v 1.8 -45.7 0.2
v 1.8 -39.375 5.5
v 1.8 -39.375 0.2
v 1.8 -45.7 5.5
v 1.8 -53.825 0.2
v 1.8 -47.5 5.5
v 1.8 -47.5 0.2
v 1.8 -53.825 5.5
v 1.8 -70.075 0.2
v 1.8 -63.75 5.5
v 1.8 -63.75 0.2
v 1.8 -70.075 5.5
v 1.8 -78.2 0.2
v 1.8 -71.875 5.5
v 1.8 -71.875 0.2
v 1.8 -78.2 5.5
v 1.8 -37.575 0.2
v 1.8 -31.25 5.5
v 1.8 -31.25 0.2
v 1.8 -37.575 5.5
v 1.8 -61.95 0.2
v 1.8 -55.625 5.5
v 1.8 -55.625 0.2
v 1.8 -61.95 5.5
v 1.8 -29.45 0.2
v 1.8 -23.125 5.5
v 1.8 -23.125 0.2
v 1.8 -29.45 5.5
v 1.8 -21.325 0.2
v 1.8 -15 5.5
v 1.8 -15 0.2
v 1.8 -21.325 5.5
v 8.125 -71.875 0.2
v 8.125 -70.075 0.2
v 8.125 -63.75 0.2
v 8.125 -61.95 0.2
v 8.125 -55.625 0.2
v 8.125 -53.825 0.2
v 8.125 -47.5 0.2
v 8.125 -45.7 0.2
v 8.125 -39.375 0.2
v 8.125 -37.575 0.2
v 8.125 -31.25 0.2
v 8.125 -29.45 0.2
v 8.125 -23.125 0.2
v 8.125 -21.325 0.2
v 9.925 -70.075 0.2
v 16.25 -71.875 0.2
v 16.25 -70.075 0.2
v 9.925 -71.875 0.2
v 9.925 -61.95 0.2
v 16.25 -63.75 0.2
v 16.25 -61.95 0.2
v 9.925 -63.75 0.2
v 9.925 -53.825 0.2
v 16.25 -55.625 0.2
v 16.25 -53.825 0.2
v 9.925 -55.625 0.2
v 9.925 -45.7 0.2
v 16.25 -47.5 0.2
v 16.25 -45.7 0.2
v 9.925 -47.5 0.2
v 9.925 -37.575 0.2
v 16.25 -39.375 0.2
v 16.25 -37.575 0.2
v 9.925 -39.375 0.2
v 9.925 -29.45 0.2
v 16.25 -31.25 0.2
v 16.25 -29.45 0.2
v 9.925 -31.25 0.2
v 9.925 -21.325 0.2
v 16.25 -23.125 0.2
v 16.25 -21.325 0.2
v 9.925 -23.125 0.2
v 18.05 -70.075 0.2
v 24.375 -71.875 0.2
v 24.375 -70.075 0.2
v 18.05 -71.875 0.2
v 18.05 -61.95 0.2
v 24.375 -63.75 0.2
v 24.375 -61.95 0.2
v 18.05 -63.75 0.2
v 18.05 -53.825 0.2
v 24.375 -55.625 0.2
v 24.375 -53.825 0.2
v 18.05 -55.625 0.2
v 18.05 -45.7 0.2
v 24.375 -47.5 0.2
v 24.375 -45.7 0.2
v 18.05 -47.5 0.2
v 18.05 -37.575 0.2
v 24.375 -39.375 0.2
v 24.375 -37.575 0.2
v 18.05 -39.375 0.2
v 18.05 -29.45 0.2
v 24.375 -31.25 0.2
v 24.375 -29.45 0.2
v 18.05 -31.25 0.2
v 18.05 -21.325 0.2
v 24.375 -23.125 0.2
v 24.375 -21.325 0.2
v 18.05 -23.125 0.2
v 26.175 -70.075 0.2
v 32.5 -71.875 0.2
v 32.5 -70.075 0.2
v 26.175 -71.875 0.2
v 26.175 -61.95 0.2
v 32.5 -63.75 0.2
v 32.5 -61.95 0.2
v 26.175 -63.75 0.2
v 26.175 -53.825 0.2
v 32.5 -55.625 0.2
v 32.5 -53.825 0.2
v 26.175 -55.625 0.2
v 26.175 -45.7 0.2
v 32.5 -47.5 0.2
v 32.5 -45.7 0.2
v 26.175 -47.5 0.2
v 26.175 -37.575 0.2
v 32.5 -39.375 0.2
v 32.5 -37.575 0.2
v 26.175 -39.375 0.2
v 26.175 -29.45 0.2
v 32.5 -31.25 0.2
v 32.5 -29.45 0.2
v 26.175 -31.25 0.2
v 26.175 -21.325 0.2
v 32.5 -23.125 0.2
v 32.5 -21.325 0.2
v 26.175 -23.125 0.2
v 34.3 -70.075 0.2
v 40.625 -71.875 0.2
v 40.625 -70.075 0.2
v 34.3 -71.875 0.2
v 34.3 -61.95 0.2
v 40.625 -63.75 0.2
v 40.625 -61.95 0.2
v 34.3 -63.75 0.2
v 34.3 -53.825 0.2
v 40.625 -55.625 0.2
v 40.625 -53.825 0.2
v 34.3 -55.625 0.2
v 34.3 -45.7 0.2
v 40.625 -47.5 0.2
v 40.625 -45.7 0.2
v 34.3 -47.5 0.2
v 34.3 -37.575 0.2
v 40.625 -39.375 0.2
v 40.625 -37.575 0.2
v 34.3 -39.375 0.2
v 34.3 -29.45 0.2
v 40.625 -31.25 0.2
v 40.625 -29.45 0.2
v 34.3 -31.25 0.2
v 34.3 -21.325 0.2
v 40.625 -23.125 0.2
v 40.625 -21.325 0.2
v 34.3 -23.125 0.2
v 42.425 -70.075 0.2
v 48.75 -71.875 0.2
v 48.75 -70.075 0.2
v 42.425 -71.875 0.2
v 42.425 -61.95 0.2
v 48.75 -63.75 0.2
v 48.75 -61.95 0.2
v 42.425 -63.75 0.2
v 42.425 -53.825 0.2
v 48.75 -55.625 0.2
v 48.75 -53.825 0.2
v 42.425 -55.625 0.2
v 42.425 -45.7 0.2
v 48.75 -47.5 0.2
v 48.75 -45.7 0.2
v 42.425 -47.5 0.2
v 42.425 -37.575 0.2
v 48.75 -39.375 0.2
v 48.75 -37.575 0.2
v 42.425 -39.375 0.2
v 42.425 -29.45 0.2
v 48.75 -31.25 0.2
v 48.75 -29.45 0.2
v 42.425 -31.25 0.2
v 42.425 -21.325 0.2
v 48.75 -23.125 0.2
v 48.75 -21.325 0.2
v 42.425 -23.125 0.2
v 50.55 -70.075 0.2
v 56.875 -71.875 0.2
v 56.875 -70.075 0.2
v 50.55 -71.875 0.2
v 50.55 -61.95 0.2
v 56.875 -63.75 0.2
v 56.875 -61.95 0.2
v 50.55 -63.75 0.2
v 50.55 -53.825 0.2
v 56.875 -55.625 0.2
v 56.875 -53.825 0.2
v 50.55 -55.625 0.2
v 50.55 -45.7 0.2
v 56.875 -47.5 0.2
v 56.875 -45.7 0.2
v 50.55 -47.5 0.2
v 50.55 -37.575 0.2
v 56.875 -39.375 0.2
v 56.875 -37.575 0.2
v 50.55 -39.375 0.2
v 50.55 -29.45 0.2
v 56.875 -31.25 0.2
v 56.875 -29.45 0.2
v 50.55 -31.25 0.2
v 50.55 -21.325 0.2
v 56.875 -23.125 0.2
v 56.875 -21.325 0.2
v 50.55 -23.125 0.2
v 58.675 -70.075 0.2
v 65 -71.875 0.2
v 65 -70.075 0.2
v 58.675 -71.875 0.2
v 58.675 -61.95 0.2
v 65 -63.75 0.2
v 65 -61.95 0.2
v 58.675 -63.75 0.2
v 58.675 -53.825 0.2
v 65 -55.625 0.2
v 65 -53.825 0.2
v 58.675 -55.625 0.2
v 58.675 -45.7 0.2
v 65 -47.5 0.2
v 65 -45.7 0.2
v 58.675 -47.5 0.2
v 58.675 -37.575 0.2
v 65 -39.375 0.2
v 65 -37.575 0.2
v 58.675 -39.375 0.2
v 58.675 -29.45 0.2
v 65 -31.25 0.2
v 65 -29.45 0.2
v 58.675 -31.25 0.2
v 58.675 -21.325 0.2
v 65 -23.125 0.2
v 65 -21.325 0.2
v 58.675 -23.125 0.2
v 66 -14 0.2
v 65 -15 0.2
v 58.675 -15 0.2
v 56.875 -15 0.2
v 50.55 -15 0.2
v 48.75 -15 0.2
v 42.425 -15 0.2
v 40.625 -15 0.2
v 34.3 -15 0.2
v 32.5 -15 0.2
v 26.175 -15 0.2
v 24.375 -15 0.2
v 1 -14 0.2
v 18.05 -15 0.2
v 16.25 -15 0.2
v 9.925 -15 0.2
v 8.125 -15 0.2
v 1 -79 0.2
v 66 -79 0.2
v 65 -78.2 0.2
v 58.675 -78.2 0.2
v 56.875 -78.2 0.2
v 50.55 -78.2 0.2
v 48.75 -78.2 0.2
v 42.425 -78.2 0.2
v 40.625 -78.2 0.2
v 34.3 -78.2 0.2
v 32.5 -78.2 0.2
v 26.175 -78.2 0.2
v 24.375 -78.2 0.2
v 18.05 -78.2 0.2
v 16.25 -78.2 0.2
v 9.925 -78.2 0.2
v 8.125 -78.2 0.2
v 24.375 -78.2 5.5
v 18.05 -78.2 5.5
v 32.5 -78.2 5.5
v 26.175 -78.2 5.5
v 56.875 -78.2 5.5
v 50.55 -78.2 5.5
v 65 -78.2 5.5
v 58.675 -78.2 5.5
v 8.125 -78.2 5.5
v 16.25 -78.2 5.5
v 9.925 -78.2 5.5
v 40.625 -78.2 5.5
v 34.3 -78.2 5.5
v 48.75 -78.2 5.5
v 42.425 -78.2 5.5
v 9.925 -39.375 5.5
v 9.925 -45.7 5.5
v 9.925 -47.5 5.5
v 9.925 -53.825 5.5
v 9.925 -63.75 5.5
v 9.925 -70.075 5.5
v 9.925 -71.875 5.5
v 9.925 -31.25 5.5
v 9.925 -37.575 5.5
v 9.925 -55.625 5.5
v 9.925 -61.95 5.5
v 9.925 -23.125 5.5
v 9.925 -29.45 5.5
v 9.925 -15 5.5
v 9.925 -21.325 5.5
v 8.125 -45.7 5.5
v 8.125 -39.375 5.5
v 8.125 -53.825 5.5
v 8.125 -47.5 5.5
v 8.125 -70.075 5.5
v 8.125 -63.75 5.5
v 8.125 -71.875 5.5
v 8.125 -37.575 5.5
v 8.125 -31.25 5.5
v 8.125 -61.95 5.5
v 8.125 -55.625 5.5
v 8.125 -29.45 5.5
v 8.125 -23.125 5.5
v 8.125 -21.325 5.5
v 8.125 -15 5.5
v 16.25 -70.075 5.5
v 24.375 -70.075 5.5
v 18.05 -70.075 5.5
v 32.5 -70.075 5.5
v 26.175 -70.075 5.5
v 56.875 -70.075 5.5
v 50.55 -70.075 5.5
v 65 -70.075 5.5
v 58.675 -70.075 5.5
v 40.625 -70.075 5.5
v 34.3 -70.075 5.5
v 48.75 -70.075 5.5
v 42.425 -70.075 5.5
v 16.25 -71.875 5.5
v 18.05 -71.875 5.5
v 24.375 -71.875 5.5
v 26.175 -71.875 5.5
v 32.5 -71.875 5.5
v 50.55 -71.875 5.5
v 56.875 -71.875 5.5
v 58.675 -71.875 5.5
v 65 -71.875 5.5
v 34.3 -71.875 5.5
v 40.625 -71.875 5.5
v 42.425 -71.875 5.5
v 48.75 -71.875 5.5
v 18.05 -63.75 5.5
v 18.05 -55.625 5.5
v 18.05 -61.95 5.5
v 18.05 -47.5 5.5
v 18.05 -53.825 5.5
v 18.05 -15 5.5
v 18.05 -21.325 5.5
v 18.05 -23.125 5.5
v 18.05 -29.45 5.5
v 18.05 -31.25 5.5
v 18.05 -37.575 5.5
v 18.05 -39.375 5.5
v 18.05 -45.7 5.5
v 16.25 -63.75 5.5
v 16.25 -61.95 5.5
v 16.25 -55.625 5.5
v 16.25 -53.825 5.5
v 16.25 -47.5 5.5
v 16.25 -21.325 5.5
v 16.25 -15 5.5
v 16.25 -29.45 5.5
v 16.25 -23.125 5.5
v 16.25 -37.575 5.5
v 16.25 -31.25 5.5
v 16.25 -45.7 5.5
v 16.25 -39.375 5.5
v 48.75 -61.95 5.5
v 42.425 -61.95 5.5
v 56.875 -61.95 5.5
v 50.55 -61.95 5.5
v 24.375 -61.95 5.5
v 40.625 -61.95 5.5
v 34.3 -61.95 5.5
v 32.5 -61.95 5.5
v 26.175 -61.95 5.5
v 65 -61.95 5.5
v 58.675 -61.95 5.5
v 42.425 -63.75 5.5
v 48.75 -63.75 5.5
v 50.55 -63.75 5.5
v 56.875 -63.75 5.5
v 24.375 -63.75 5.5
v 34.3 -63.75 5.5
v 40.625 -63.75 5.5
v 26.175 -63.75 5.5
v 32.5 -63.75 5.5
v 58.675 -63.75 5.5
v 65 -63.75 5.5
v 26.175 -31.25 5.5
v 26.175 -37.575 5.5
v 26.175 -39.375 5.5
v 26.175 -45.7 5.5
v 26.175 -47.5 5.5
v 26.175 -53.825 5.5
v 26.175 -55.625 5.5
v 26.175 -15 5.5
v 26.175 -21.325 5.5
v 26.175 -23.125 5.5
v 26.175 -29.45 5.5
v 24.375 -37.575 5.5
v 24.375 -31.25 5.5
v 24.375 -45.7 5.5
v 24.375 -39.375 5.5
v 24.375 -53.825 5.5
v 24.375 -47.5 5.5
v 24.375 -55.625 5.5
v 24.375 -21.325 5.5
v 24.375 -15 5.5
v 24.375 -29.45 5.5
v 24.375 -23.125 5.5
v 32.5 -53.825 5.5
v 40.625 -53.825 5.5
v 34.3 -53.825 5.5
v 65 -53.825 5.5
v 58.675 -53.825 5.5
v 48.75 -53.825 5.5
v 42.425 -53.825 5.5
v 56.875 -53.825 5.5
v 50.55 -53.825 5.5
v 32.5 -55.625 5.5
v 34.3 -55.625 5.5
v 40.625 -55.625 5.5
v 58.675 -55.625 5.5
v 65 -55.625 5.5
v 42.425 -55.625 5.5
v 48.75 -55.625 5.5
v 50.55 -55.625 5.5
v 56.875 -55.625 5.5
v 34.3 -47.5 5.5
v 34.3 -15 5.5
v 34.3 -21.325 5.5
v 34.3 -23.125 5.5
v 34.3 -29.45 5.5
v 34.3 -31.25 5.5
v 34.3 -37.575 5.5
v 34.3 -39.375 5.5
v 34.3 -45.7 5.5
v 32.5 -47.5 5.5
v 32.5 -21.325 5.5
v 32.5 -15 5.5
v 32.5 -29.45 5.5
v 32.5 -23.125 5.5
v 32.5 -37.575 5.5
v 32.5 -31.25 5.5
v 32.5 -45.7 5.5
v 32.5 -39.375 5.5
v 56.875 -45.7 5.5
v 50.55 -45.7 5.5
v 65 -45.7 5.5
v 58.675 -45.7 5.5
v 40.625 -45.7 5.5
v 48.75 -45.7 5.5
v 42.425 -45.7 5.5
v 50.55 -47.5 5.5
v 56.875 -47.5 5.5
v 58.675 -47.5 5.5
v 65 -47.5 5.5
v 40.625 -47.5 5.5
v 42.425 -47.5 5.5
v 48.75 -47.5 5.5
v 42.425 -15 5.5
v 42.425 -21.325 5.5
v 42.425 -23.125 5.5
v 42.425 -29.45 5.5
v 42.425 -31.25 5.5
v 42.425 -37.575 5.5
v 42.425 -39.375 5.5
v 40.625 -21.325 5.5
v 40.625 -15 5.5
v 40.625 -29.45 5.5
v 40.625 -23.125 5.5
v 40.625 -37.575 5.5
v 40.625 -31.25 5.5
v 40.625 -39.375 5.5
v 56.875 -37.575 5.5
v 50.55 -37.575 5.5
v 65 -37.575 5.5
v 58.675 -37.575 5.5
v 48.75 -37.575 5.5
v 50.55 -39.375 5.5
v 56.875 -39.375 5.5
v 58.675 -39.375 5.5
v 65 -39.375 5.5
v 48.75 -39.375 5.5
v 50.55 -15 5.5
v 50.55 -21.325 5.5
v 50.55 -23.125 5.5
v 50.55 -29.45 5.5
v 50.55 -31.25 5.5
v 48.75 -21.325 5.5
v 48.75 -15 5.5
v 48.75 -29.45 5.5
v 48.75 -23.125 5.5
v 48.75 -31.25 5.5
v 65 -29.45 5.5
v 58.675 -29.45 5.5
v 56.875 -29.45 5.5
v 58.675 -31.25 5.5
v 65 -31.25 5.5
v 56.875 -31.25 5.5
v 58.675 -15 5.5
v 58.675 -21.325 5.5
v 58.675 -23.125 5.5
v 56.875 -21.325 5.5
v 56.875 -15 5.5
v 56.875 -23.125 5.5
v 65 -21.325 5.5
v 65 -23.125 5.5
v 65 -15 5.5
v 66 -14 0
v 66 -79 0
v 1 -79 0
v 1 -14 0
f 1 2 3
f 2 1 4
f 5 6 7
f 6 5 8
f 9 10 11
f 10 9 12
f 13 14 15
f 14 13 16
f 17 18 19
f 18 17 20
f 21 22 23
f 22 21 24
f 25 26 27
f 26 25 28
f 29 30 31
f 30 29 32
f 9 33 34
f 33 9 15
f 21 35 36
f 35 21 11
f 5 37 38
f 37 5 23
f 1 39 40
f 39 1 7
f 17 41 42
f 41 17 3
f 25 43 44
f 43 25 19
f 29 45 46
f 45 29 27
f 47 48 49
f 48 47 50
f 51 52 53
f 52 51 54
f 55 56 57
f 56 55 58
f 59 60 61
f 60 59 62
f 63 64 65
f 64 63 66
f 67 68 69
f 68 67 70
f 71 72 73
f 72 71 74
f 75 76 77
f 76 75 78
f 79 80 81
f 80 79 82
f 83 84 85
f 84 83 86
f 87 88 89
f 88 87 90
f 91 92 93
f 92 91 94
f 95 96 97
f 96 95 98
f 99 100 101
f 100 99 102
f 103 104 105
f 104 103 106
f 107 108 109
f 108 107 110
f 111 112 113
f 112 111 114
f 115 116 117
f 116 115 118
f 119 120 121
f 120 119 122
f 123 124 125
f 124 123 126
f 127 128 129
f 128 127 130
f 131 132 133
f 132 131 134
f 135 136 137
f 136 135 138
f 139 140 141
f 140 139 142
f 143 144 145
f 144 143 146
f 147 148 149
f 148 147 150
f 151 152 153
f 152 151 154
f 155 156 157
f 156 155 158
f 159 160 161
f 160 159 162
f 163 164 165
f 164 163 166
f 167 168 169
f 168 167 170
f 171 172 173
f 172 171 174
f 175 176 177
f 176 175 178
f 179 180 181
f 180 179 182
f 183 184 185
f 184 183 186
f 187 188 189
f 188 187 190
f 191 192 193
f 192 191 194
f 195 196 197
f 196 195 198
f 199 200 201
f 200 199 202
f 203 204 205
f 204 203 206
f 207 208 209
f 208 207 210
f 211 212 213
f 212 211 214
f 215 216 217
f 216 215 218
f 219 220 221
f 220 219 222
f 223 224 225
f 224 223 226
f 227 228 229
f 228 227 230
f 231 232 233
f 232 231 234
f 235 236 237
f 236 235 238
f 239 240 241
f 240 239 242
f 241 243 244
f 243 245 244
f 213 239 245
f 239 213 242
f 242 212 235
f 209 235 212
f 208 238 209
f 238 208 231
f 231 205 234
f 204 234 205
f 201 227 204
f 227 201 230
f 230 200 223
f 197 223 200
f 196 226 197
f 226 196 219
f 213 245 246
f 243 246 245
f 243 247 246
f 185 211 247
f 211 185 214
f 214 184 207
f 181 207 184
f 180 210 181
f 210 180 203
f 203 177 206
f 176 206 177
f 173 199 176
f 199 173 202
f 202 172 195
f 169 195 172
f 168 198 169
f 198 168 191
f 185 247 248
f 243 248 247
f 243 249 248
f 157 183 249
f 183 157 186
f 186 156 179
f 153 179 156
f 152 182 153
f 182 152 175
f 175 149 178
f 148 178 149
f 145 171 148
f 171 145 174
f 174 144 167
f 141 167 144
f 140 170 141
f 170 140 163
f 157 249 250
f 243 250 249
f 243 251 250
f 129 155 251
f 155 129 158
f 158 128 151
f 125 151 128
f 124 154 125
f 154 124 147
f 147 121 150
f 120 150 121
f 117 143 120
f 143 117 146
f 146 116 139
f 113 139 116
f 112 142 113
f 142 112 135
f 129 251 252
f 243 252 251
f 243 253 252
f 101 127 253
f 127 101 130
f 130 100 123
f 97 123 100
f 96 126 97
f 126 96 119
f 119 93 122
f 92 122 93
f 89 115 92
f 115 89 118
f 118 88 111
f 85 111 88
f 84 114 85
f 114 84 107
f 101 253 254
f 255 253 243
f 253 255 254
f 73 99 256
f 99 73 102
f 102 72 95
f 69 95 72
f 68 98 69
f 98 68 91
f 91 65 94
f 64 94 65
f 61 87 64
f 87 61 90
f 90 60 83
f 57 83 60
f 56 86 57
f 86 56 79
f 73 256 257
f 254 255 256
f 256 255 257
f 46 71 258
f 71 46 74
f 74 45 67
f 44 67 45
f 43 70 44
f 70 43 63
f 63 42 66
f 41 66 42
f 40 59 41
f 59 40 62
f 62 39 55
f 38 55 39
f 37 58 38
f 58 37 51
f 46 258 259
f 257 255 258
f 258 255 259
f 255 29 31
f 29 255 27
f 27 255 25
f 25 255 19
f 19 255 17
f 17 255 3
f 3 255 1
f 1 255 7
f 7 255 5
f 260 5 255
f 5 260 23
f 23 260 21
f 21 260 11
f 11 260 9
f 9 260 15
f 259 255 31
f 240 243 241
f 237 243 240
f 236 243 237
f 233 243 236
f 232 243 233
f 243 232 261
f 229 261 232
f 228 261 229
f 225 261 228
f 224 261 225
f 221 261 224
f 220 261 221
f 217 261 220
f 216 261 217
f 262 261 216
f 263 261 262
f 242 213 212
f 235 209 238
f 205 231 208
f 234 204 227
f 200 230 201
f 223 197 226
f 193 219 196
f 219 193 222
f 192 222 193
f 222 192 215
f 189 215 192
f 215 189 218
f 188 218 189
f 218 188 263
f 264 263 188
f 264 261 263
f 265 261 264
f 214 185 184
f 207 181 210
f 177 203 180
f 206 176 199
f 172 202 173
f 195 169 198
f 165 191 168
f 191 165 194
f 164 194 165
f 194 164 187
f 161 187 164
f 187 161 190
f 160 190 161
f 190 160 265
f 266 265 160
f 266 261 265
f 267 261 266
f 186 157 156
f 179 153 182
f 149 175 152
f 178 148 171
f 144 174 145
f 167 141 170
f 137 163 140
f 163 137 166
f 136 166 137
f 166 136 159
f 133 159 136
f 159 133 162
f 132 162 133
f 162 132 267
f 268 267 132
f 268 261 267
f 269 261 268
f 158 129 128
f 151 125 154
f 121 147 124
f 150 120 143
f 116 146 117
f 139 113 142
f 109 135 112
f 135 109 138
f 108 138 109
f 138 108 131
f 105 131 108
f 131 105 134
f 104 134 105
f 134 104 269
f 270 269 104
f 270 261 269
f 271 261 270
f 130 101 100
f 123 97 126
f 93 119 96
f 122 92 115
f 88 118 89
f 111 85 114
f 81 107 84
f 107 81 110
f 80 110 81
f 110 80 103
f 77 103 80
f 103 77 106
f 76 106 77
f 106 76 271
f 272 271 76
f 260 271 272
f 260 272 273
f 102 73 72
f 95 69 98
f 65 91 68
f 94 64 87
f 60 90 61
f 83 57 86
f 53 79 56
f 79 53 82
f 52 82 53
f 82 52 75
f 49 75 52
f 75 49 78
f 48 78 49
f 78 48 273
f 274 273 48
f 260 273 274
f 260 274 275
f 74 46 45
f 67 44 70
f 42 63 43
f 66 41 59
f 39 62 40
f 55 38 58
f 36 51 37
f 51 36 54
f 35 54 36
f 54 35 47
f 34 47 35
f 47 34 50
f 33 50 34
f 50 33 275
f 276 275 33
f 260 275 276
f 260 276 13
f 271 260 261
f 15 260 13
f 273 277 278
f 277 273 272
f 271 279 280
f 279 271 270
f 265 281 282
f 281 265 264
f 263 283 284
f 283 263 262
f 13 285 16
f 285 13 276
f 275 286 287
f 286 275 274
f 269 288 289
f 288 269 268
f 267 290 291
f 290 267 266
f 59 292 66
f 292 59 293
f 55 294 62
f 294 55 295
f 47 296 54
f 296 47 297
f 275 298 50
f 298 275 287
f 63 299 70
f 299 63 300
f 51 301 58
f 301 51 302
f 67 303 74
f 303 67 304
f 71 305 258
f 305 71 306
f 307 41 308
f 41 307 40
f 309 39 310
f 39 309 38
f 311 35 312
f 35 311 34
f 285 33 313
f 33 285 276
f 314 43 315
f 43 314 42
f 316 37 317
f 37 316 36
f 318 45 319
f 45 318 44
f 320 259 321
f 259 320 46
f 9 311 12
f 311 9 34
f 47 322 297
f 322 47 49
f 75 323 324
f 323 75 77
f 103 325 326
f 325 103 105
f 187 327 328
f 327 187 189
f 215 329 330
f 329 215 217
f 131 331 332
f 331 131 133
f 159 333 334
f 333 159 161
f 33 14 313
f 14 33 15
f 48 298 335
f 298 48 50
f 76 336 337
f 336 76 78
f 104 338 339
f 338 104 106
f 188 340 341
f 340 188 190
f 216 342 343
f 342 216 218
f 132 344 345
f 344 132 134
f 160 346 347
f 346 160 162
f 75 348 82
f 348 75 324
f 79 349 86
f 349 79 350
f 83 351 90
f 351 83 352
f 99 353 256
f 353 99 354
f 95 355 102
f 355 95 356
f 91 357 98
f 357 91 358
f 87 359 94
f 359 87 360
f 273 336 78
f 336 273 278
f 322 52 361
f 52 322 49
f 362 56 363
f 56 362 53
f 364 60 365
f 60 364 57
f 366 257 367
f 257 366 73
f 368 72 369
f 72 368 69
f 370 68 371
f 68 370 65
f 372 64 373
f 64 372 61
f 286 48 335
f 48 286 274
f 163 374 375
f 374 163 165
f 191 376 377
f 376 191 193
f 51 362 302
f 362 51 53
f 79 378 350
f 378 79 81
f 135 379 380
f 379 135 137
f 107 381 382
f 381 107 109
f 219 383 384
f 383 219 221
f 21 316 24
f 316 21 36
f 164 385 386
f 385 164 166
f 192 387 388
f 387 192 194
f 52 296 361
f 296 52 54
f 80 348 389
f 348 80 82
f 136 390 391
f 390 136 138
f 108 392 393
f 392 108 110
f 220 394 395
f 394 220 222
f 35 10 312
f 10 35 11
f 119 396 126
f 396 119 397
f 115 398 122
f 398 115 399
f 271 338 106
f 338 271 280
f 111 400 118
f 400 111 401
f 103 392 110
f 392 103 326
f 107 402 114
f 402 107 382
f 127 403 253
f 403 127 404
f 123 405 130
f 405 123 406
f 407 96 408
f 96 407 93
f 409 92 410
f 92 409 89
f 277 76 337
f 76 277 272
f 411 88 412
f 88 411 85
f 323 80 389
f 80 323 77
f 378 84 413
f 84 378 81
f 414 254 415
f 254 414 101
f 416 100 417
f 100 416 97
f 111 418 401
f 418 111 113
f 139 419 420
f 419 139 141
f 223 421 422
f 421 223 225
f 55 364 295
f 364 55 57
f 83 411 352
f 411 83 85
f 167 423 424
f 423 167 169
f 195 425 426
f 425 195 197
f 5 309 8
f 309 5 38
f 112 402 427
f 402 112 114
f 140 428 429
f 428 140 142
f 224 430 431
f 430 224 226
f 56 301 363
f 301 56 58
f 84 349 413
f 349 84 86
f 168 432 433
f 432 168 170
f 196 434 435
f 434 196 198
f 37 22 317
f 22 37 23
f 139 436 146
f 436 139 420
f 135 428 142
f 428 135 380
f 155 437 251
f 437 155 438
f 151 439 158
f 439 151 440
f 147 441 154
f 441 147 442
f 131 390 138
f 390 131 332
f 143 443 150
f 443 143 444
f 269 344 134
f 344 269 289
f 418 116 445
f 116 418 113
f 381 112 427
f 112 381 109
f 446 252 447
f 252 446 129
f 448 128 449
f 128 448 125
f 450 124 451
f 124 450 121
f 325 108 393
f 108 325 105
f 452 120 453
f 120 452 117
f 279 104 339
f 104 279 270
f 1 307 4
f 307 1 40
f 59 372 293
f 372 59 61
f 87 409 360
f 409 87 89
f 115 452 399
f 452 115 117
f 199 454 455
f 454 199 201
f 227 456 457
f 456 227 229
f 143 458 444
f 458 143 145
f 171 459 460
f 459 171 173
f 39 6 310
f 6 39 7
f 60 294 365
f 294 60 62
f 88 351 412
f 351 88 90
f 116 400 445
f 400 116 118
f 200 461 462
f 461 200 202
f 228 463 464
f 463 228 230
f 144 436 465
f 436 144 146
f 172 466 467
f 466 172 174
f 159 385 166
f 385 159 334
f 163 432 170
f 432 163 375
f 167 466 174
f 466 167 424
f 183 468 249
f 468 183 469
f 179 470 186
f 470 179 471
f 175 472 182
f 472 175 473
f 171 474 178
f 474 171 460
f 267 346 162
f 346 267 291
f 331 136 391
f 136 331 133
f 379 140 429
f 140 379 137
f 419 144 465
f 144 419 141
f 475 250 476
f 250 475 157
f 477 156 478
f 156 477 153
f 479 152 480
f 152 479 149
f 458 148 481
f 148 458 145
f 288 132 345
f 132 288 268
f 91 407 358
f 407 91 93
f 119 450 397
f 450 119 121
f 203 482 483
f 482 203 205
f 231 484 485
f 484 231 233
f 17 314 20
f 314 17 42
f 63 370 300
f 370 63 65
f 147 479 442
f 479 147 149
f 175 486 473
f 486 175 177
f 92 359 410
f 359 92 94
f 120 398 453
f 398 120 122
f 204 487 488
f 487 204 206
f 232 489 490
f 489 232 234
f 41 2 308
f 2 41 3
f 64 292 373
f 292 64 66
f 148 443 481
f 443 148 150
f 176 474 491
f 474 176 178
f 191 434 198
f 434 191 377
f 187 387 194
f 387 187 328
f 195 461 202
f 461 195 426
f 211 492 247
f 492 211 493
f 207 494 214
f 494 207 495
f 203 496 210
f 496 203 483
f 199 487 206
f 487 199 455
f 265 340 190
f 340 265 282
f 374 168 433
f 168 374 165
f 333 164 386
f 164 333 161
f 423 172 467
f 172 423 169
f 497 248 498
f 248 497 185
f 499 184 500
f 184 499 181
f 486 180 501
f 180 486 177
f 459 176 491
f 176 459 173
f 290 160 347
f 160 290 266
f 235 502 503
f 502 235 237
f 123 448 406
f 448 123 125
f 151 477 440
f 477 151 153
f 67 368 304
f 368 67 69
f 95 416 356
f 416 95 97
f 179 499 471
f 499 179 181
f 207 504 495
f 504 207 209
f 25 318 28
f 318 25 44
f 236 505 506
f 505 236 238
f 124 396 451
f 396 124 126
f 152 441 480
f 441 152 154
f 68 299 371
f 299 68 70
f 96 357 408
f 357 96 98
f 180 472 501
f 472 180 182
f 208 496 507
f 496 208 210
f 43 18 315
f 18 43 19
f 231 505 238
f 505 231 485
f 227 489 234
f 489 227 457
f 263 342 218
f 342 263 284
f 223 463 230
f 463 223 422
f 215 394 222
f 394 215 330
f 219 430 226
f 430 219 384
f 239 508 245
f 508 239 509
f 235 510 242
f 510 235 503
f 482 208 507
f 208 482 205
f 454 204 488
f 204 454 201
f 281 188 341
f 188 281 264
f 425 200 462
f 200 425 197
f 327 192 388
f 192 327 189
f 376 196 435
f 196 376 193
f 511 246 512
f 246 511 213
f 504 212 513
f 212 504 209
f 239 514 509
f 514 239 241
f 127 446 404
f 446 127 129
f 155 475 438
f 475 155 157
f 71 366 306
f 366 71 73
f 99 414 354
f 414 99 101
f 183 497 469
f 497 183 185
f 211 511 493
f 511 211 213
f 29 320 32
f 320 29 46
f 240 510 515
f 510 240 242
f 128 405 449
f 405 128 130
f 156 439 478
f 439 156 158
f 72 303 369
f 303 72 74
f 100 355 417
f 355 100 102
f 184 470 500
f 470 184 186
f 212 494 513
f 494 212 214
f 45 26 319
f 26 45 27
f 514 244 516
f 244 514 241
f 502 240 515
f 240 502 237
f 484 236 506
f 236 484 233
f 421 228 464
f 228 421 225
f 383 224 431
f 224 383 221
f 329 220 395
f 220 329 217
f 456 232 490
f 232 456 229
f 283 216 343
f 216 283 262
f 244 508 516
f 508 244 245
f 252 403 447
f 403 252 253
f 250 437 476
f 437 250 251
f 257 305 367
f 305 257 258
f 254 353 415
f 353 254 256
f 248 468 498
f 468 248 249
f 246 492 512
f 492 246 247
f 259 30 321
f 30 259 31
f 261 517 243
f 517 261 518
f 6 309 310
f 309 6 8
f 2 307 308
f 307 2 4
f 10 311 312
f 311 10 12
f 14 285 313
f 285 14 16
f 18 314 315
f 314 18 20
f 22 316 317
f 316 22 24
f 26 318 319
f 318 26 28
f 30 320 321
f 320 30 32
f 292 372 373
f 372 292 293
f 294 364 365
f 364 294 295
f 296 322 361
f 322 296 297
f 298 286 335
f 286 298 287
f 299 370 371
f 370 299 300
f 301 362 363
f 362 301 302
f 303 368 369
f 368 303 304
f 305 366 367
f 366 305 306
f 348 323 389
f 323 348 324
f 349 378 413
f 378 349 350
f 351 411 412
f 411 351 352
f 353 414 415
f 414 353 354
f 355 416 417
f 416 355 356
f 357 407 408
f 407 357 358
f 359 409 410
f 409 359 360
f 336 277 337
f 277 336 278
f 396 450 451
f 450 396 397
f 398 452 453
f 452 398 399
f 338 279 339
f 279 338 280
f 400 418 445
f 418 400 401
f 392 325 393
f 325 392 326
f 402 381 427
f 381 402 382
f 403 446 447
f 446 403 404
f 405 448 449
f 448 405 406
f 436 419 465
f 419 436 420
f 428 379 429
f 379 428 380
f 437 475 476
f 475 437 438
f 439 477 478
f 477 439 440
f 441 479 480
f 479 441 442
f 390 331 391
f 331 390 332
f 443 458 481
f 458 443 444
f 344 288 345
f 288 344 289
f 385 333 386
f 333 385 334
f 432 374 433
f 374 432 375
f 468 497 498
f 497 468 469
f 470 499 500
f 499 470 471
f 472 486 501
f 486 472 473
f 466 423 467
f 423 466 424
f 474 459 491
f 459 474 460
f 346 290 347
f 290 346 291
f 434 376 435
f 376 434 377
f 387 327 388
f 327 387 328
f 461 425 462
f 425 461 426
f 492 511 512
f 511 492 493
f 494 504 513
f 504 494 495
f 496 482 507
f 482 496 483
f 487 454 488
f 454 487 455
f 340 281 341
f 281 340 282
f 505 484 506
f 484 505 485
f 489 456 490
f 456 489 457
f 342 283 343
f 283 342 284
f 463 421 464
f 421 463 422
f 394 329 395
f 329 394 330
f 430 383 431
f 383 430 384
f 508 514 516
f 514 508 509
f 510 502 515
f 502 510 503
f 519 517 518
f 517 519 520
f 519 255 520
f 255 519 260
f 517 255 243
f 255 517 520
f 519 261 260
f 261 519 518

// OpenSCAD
letters = [ 
	[ "F", "O", "U", "R", "N", "I", "N", "E" ],
	[ "T", "W", "E", "L", "E", "V", "E", "N" ],
	[ "S", "I", "X", "T", "H", "R", "E", "E" ],
	[ "F", "I", "V", "E", "I", "G", "H", "T" ],
	[ "D", "P", "A", "S", "T", "O", "R", "O" ],
	[ "F", "I", "V", "E", "H", "A", "L", "F" ],
	[ "Q", "U", "A", "R", "T", "E", "R", "Y" ],
	[ "A", "T", "W", "E", "N", "T", "Y", "D" ]
];

$fn = 32;
max = 65; 
s = 65/8;
d_h = 5+1;  // was 5
w_h = 10;
b_h = 5;
c_h = 23;
letter_depth = w_h+1;

f = "Stencil Gothic";

module face()
{
	for (r = [0:7])
	{
		for (c = [0:7])
		{
			#translate([r*s + s/2+.2, c*s+s/2+1-0.6, 0])
				linear_extrude(height = letter_depth+1)
					text(
						letters[c][r], 
						font = f,
						size=6, 
						$fn=20, 
						valign="center", 
						halign = "center"
					);
		}
	}
}

module case_front()
{
	difference()
	{
		union()
		{
			translate([-5,-5,0]) 	cube([5,max+6+5, w_h]);	// left side
			translate([max+1,-5,0])	cube([5,max+6+5, w_h]); // right side 
			translate([0,max+1,0]) 	cube([max+2, 5, w_h]);	// top
			translate([-1,-5,0])	cube([max+3, 5, w_h]); 	// bottom
		}
		
		// mounting holes
		
		translate([-1.5,-1.5,0]) 			cylinder(d=2.4,h=w_h-2);	// ll 
		translate([max+1+1.5,-5+3.5,0]) 	cylinder(d=2.4,h=w_h-2);	// lr
		translate([-1.5,max+1+1.5,0]) 		cylinder(d=2.4,h=w_h-2);	// ul
		translate([max+1+1.5,max+1+1.5,0])	cylinder(d=2.4,h=w_h-2);	// ur 
	}
}

module dividers(w=1,hh=d_h)
{
	for (x = [0:8])
	{
		translate([s*x, 1, 0]) cube([w,max,d_h]);
		translate([0, s*x,0]) cube([max+1, w, d_h]);
	}
}

module clock_face()
{
	difference()
	{
		union()
		{
			translate([0,0,w_h-1]) cube([max+1,max+1,1]);
			translate([0,0,b_h]) dividers();
		}
		
		face();
		
		// cutout for connector
		translate([1,56,0])
			#cube([7.125,3,7]);
	}
	case_front();
}

module diffusers()
{
	difference()
	{
		translate([1,1,0]) cube([max,max,4.5+1]);  // was 4.5
		translate([0,0,0.2])
			dividers(1.8 );
	}	
}

module standoff()
{
	difference()
	{
		cylinder(d1=7,d2=5,h=7);
		translate([0,0,2])	cylinder(d=2, h=7);
	}
}

module rtc_mounts() {
	// standoffs for rtc
	
	translate([25, 0, 2])
		standoff();
	
	translate([0, 18, 2])
		standoff();
	
	translate([25, 18, 2])
		standoff();
}

module case_back()
{
	difference()
	{
		union()
		{
			cube([max+1,max+1,2]);
			translate([-5,-5,0]) 		cube([5+1,max+6+5, c_h]);	// left side
			translate([max+1-1,-5,0])	cube([5+1,max+6+5, c_h]); // right side 
			translate([0,max-1,0]) 		#cube([max+2, 6+1, c_h]);	// top
			translate([-1,-5,0])		cube([max+2, 6+1, c_h]); 	// bottom
		}
		
		// mount holes 
		
		translate([-1.5,-1.5,0]) 			cylinder(d=3,h=c_h+4);	// ll 
		translate([max+1+1.5,-5+3.5,0]) 	cylinder(d=3,h=c_h+4);	// lr
		translate([-1.5,max+1+1.5,0]) 		cylinder(d=3,h=c_h+4);	// ul
		translate([max+1+1.5,max+1+1.5,0])	cylinder(d=3,h=c_h+4);	// ur 
		
		translate([-1.5,-1.5,0]) 			cylinder(d=5.5,h=4);	// ll 
		translate([max+1+1.5,-5+3.5,0]) 	cylinder(d=5.5,h=4);	// lr
		translate([-1.5,max+1+1.5,0]) 		cylinder(d=5.5,h=4);	// ul
		translate([max+1+1.5,max+1+1.5,0])	cylinder(d=5.5,h=4);	// ur 
		
		// FTDI cutout
		//#translate([18+6+5+6,-5,15])	cube([19, 8, 8]); 	// bottom

		// Time Adjust Button Holes

		translate([22.75+6.5+12, 10+46-2, 0])
			#cylinder(d=5,h=5);
					
		 	translate([22.75+6.5+12, 10+46+6, .2]) 
				rotate([0,180,0])
					linear_extrude(height = 0.2)
					text(
						"M", 
						font = f,
						size=6, 
						$fn=20, 
						valign="center", 
						halign = "center"
					);
		
		
		translate([22.75-6.5+25.5+12, 10+46-2, 0])	
			cylinder(d=5,h=5);
		
		translate([22.75-6.5+25.5+12, 10+46+6,.2])	rotate([0,180,0])
					linear_extrude(height = 0.2)
					text(
						"H", 
						font = f,
						size=6, 
						$fn=20, 
						valign="center", 
						halign = "center"
					);

		// power socket cutout
		
		translate([10,13,0])
			 cylinder(d=12,h=16);
		
		translate([12,26,0.2]) rotate([0,180,0])
					linear_extrude(height = 0.2)
					text(
						"+5vdc", 
						font = f,
						size=6, 
						$fn=20, 
						valign="center", 
						halign = "center"
					);
	}
	
	// standoffs for cpu pc 25.5 horiz 
	
	translate([22.75+12, 10, 2]) 			standoff();	// LL
	translate([22.75+12, 10+46, 2]) 		standoff();	// UL
	translate([22.75+25.5+12, 10, 2]) 		standoff();	// LR
	translate([22.75+25.5+12, 10+46, 2]) 	standoff();	// UR
	
	rotate([0,0,90])
		translate([30.5,-25,0])

			rtc_mounts();
}

module time_button()
{
	hull() {
		translate([18+30+5+5,10+12.5+1.5,0])	sphere(d=4);
		translate([18+30+5+5,10+12.5+1.5,0])	cylinder(d=4,h=3);
	}
	translate([18+30+5+5,10+12.5+1.5,5+.4-2.4])	cylinder(d=12,h=1.6);
	
	hull ()	{
		translate([18+30+5+5,10+30+1.5,0])	sphere(d=4);
		translate([18+30+5+5,10+30+1.5,0])	cylinder(d=4,h=3);
	}
	translate([18+30+5+5,10+30+1.5,5+.4-2.4])	cylinder(d=12,h=1.6);
}

// uncomment to print clock face
//translate([-15,0,10]) rotate([0,180,0]) clock_face();

// uncomment to print led diffusers
 translate([0,-80,0]) diffusers();

// uncomment to print back of case
// case_back();

// uncomment to print buttons
// rotate([180,0,0]) time_button();
